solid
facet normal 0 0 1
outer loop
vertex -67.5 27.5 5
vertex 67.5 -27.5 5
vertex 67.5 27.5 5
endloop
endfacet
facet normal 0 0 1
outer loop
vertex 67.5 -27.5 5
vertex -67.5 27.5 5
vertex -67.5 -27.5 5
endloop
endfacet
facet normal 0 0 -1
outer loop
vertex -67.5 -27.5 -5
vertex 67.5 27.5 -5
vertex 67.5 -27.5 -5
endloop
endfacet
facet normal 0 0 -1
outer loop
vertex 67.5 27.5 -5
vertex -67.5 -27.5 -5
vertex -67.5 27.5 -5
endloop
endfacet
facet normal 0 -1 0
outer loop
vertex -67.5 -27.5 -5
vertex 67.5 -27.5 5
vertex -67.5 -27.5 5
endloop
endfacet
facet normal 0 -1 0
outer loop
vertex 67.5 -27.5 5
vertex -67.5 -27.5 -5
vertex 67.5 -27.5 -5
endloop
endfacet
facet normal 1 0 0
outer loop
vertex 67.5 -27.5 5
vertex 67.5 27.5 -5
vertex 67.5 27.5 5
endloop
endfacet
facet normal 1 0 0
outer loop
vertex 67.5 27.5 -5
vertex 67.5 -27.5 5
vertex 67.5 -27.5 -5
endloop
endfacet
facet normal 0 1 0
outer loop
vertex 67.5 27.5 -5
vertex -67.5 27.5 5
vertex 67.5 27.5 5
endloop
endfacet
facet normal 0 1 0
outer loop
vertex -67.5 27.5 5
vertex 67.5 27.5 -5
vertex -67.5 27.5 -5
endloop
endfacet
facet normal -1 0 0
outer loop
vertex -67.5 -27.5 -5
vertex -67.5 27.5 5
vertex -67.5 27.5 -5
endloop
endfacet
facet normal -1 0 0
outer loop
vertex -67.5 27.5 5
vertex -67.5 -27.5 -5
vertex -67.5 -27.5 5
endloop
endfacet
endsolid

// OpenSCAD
// ========================================
// a 135 x 55 x 10 mm box
// NeuroCAD canonical IR; dimensions are millimetres
// ========================================
$fn = 48;

cube(size=[135, 55, 10], center=true);
